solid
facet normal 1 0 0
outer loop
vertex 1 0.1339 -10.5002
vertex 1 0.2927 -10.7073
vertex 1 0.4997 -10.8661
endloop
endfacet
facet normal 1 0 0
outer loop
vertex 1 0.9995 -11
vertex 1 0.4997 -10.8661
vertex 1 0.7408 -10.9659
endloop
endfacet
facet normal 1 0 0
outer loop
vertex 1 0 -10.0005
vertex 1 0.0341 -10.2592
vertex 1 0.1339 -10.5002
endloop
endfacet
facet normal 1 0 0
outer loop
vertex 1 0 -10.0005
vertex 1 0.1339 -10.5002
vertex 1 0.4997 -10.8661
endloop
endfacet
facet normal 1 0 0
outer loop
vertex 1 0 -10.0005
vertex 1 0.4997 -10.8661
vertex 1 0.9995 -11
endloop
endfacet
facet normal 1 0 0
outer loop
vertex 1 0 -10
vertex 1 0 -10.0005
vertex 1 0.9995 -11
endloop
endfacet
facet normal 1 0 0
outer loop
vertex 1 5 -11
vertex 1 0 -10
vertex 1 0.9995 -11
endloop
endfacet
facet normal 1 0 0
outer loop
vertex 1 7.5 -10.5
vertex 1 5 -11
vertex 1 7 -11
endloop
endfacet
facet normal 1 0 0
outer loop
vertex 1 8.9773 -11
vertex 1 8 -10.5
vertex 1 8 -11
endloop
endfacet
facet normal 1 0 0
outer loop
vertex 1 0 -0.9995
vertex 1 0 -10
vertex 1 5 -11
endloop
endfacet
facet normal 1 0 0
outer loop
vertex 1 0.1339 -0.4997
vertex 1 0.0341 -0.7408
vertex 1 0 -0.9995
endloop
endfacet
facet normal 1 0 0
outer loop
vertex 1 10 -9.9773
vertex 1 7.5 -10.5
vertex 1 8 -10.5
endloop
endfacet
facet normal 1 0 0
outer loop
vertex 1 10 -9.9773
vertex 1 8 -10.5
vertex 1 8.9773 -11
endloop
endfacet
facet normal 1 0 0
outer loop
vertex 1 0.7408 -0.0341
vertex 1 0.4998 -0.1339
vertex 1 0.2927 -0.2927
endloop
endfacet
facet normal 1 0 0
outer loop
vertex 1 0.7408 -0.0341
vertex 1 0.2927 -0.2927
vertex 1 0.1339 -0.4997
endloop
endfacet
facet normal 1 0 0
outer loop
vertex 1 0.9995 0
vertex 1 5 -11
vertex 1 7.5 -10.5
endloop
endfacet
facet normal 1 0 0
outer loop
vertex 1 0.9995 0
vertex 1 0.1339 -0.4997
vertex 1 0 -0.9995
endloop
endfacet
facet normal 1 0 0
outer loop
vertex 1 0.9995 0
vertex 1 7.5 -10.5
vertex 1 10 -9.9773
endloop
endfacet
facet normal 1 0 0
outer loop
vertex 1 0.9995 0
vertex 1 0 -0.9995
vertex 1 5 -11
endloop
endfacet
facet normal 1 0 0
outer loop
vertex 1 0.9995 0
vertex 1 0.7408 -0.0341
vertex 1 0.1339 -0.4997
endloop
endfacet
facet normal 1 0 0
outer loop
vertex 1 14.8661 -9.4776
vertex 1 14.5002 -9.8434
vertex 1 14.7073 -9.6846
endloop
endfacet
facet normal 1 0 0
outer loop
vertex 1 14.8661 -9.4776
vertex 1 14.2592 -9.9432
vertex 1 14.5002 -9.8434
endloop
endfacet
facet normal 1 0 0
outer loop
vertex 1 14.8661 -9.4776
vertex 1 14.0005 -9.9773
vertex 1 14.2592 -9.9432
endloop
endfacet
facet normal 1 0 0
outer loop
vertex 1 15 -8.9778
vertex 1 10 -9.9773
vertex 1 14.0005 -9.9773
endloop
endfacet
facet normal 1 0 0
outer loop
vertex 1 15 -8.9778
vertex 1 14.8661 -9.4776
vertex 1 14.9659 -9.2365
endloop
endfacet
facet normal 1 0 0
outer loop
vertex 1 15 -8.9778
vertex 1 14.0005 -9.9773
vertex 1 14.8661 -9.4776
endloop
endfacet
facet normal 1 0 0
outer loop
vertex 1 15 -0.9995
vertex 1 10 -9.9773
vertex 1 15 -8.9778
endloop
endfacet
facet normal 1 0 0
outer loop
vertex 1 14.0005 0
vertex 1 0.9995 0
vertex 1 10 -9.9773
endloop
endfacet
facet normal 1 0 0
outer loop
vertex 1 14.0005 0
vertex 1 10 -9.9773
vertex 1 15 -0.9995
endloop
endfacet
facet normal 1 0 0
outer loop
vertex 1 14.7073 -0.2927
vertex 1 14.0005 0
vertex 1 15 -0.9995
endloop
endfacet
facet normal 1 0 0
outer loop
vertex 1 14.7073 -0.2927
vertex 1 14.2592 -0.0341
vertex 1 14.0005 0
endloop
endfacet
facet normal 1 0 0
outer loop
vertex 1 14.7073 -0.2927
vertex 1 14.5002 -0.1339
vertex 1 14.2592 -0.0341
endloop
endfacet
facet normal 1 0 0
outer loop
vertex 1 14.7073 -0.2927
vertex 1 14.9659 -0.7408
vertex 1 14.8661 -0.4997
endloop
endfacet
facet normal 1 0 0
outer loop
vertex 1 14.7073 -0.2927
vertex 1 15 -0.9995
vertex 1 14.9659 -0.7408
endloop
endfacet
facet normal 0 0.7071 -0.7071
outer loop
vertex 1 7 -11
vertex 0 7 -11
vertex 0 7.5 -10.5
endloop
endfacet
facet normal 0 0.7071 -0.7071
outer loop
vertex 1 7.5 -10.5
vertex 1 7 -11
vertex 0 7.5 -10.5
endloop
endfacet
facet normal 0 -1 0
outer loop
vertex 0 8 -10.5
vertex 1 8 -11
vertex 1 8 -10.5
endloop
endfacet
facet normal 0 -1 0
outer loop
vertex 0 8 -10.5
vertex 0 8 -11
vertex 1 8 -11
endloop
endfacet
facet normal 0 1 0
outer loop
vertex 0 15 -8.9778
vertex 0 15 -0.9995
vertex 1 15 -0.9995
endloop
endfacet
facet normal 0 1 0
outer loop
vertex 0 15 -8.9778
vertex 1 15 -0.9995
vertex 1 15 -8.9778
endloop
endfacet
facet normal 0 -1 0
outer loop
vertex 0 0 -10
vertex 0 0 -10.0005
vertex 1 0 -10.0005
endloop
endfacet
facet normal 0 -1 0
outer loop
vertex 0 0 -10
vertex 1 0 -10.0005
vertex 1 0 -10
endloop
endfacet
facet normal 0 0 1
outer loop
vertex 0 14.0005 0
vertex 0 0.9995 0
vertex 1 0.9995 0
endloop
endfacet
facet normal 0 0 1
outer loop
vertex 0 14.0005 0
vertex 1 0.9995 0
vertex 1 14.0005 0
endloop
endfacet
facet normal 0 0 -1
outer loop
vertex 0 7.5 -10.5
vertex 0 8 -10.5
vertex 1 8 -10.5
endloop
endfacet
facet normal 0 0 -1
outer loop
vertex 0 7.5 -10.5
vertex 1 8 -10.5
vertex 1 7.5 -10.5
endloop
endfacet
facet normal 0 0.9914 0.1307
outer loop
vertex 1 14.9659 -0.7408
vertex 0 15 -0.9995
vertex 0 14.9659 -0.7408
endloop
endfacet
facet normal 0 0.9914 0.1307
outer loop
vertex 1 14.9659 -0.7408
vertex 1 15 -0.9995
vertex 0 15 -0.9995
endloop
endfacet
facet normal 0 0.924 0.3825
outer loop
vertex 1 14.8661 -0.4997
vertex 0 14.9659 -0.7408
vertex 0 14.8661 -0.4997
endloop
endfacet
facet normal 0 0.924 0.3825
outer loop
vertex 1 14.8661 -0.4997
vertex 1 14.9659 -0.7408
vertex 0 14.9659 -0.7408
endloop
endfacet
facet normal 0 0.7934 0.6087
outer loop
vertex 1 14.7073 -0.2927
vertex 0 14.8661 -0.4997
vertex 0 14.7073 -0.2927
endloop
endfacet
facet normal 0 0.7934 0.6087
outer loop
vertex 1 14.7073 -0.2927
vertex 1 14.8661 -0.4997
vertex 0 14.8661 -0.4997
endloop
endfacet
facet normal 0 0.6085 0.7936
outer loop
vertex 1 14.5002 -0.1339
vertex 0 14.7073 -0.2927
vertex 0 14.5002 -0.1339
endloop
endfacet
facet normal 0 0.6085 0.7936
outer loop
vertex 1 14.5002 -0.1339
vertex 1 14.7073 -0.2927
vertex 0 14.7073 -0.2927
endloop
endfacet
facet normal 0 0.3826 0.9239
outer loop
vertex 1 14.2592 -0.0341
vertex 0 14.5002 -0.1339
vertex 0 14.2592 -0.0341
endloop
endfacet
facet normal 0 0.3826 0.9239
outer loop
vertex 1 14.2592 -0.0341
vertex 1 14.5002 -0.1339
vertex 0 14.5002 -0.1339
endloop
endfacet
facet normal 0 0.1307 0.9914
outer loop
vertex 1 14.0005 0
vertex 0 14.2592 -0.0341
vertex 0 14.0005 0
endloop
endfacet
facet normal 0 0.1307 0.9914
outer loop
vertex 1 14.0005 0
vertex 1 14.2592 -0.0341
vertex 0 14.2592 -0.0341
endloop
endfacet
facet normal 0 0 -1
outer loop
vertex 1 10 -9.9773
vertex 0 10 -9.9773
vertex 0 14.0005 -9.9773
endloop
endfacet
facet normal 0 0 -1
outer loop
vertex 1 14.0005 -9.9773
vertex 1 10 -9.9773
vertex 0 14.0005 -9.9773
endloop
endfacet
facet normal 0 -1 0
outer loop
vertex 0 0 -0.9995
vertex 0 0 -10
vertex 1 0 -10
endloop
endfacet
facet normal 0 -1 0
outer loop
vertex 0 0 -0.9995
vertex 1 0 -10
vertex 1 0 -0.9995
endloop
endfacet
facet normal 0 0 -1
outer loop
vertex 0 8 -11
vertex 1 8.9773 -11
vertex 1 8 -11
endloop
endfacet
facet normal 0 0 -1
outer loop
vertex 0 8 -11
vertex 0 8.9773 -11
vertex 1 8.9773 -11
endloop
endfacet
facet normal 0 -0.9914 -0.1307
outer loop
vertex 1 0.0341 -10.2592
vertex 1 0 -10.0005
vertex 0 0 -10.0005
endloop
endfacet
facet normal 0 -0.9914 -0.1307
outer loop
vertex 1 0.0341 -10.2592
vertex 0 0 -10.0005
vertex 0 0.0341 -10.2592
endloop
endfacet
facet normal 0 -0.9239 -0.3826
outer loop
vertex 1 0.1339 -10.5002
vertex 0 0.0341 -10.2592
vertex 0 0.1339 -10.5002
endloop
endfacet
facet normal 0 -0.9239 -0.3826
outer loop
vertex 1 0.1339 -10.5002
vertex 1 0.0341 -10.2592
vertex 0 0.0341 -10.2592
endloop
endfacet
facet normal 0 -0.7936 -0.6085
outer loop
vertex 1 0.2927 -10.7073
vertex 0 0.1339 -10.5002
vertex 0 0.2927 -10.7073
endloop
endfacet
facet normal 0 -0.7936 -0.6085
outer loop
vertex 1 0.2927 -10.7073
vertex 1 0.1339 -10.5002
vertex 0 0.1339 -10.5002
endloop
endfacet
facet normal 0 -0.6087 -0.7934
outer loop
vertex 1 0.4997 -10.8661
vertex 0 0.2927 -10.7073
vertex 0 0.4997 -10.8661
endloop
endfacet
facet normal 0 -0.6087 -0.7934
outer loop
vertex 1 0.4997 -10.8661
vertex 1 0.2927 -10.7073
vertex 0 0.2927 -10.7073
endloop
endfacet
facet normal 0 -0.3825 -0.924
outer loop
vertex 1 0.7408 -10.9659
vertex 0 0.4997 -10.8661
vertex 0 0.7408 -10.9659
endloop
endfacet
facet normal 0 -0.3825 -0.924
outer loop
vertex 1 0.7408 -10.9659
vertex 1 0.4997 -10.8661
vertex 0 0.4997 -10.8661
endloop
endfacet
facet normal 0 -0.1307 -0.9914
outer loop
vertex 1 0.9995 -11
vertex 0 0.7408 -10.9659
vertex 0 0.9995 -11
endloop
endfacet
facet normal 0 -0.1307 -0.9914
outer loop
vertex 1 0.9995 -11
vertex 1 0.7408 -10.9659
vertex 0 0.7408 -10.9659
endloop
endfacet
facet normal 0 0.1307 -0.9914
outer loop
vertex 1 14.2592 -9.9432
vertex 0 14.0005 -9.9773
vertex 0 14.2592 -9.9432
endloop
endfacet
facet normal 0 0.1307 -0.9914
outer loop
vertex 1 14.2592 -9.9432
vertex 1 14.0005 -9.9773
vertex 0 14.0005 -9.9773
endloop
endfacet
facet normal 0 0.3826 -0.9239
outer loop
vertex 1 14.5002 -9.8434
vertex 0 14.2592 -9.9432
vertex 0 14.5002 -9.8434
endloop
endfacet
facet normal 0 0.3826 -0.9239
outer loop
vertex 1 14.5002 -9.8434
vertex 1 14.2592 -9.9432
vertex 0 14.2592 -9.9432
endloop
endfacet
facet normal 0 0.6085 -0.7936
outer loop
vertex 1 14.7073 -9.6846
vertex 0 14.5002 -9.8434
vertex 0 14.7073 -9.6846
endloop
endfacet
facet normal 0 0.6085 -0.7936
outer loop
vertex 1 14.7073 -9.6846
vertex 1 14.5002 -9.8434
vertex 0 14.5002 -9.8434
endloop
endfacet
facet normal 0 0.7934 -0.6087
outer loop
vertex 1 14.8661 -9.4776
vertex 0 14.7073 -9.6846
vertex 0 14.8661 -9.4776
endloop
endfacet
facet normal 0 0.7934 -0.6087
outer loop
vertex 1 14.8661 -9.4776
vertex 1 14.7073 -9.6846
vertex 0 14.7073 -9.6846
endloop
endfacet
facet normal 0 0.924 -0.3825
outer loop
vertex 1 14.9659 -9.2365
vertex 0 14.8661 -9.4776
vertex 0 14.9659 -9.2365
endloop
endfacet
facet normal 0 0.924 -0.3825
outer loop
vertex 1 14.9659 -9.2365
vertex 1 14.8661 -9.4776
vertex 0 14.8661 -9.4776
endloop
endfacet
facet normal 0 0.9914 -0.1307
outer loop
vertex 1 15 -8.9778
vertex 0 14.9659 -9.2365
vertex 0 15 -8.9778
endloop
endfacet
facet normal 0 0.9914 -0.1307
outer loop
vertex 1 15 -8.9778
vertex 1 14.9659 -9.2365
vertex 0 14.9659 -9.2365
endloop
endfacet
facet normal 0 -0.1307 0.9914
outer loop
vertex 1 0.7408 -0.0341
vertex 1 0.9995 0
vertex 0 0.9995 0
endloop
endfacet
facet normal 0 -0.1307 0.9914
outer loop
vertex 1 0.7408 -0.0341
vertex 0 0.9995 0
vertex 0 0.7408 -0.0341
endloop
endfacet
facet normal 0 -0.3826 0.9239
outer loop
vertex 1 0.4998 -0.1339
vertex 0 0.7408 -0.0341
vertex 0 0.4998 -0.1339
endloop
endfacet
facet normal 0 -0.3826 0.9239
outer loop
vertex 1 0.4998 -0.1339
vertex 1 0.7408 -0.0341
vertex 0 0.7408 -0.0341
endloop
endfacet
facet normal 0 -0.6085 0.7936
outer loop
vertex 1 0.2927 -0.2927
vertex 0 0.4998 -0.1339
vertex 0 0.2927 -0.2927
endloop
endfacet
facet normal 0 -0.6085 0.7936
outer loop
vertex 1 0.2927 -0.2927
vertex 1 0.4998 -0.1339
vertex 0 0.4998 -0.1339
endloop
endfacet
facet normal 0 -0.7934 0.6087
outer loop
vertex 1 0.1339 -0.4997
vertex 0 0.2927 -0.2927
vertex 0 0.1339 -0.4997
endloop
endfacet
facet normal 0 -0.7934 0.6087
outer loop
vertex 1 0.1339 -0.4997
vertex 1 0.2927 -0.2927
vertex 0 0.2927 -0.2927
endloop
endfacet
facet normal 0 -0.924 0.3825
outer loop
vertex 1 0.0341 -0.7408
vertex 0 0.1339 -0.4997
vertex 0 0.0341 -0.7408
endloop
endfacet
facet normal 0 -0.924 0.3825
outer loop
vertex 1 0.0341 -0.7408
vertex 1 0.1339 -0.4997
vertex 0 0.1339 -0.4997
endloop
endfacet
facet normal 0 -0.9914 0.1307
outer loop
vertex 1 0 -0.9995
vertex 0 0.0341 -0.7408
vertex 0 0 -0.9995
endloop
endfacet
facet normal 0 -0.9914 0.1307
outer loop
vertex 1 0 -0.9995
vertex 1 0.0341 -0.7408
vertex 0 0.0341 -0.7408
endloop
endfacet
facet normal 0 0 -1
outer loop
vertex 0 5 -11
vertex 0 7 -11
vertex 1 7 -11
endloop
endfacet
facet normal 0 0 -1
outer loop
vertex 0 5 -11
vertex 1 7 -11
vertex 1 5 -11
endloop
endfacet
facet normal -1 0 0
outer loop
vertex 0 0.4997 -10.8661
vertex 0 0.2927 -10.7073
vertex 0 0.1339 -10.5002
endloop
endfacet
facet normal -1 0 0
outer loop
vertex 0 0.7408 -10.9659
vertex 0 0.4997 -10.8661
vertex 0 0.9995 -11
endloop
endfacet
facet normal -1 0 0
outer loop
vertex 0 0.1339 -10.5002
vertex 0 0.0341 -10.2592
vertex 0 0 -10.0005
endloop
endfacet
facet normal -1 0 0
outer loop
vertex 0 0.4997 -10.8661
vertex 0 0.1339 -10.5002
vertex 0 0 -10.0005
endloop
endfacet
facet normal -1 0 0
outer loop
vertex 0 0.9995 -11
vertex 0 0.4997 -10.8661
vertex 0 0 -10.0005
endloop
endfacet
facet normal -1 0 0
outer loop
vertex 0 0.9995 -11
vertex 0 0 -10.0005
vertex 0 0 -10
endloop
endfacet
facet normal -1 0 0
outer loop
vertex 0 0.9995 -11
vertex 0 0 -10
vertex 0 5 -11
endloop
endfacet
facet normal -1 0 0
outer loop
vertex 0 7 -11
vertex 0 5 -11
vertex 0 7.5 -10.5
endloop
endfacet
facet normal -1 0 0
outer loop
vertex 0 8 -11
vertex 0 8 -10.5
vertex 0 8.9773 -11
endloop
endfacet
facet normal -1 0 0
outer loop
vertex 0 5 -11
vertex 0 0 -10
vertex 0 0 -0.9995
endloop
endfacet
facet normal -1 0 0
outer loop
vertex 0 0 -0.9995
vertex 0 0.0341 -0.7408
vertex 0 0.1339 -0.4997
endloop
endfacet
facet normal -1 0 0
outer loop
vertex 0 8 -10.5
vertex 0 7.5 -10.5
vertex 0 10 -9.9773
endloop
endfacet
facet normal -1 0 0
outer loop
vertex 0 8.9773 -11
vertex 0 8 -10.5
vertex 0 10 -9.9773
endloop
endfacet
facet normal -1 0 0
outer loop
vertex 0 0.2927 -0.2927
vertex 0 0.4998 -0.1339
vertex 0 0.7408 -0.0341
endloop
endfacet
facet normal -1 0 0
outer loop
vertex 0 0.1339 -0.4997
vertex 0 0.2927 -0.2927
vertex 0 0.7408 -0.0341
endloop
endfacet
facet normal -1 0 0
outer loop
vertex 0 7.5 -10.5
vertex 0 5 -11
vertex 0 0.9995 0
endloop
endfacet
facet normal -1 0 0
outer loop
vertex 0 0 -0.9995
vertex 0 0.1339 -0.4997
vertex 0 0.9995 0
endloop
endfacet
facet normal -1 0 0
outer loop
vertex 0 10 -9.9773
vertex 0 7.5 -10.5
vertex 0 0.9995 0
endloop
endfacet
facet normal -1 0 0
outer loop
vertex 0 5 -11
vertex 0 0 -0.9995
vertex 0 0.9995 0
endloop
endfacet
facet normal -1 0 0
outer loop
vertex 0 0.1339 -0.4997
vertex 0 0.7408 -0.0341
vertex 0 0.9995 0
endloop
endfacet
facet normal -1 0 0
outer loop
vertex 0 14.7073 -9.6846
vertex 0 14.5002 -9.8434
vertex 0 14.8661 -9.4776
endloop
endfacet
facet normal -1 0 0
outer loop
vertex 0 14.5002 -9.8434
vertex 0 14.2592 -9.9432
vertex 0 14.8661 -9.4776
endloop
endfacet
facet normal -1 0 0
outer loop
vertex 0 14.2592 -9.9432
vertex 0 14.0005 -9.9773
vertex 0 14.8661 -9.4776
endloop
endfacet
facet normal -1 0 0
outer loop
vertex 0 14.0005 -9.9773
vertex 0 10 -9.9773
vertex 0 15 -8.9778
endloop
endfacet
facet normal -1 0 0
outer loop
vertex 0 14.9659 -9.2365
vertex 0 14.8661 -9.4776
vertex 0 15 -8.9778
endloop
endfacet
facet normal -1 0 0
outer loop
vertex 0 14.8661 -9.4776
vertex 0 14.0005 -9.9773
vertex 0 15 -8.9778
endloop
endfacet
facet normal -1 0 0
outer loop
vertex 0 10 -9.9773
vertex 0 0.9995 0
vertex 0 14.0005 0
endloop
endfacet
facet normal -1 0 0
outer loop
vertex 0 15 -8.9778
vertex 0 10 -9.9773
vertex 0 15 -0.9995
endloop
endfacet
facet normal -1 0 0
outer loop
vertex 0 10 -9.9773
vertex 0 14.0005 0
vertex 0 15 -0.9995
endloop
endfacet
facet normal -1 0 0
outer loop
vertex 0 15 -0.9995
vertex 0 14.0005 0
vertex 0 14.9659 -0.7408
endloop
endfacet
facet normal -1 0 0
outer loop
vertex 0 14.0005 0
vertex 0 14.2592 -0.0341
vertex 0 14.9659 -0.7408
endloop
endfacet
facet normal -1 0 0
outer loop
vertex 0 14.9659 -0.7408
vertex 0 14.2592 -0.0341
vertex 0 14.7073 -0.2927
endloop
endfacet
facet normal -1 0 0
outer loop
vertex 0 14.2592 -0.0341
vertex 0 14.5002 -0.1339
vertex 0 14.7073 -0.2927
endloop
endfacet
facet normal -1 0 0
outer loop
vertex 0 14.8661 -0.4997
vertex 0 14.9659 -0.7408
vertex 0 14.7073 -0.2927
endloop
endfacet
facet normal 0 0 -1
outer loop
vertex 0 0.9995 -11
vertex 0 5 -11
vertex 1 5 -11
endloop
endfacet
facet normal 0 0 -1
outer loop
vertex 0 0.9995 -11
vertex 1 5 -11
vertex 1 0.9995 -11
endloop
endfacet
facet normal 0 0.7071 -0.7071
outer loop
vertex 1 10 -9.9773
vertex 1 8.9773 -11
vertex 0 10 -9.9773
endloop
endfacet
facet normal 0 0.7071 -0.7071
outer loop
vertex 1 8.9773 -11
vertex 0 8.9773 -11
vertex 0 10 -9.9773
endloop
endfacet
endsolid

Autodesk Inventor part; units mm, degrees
ref_plane "YZ Plane" through (0, 0, 0) normal (1, 0, 0) x (0, 1, 0)
ref_plane "XZ Plane" through (0, 0, 0) normal (0, 1, 0) x (-1, 0, 0)
ref_plane "XY Plane" through (0, 0, 0) normal (0, 0, 1) x (1, 0, 0)
sketch "스케치1" plane through (0, 0, 0) normal (1, 0, 0) x (0, 1, 0)
  line L0 (0, 0) -> (15, 0)
  line L1 (15, 0) -> (15, -11)
  line L2 (15, -11) -> (0, -11)
  line L3 (0, -11) -> (0, 0)
  line L4 (15, -11) -> (8.9773, -11)
  line L5 (10, -9.9773) -> (15, -9.9773)
  line L6 (15, -9.9773) -> (15, -11)
  line L7 (0, -11) -> (5, -11)
  line L8 (0, -10) -> (0, -11)
  line L9 (5, -11) -> (7, -11)
  line L10 (7, -11) -> (8, -11)
  line L11 (8, -11) -> (8, -10.5)
  line L12 (8.9773, -11) -> (10, -9.9773)
  line L13 (8.9773, -11) -> (10.4236, -11) construction
  line L14 (7, -11) -> (7.5, -10.5)
  line L15 (8, -10.5) -> (7.5, -10.5)
  dimension "d0" = 15
  dimension "d1" = 11
  dimension "d8" = 45
  dimension "d9" = 5
extrude "돌출1" add sketch "스케치1" along normal blind 1 contours L0 L1 L5 L12 L2 L11 L15 L14 L3
fillet "모깎기1" radius 1 4 edges at (0.5, 15, -9.9773) (0.5, 15, 0) (0.5, 0, -11) (0.5, 0, 0)
sketch "스케치2" plane through (1, 0, 0) normal (1, 0, 0) x (0, 0, -1)
  arc A0 (0, 1) -> (1, 0) centre (1, 1) ccw projected
  line L0 (1, 0) -> (10, 0) projected
  arc A1 (10, 0) -> (11, 1) centre (10, 1) ccw projected
  line L1 (11, 1) -> (11, 7) projected
  line L2 (11, 7) -> (10.5, 7.5) projected
  line L3 (10.5, 7.5) -> (10.5, 8) projected
  line L4 (10.5, 8) -> (11, 8) projected
  line L5 (11, 8) -> (11, 8.9773) projected
  line L6 (11, 8.9773) -> (9.9773, 10) projected
  line L7 (9.9773, 10) -> (9.9773, 14) projected
  arc A2 (9.9773, 14) -> (8.9773, 15) centre (8.9773, 14) ccw projected
  line L8 (8.9773, 15) -> (1, 15) projected
  arc A3 (1, 15) -> (0, 14) centre (1, 14) ccw projected
  line L9 (0, 14) -> (0, 1) projected
  line L10 (-0.1139, -0.2414) -> (-0.1139, 15.1589) construction
  line L11 (-0.1139, 15.1589) -> (11.0874, 15.1589) construction
  line L12 (11.0874, 15.1589) -> (11.0874, -0.2414) construction
  line L13 (11.0874, -0.2414) -> (-0.1139, -0.2414) construction
  point P0 (0, 0)
decal "전사1"
properties part number "microsd"
